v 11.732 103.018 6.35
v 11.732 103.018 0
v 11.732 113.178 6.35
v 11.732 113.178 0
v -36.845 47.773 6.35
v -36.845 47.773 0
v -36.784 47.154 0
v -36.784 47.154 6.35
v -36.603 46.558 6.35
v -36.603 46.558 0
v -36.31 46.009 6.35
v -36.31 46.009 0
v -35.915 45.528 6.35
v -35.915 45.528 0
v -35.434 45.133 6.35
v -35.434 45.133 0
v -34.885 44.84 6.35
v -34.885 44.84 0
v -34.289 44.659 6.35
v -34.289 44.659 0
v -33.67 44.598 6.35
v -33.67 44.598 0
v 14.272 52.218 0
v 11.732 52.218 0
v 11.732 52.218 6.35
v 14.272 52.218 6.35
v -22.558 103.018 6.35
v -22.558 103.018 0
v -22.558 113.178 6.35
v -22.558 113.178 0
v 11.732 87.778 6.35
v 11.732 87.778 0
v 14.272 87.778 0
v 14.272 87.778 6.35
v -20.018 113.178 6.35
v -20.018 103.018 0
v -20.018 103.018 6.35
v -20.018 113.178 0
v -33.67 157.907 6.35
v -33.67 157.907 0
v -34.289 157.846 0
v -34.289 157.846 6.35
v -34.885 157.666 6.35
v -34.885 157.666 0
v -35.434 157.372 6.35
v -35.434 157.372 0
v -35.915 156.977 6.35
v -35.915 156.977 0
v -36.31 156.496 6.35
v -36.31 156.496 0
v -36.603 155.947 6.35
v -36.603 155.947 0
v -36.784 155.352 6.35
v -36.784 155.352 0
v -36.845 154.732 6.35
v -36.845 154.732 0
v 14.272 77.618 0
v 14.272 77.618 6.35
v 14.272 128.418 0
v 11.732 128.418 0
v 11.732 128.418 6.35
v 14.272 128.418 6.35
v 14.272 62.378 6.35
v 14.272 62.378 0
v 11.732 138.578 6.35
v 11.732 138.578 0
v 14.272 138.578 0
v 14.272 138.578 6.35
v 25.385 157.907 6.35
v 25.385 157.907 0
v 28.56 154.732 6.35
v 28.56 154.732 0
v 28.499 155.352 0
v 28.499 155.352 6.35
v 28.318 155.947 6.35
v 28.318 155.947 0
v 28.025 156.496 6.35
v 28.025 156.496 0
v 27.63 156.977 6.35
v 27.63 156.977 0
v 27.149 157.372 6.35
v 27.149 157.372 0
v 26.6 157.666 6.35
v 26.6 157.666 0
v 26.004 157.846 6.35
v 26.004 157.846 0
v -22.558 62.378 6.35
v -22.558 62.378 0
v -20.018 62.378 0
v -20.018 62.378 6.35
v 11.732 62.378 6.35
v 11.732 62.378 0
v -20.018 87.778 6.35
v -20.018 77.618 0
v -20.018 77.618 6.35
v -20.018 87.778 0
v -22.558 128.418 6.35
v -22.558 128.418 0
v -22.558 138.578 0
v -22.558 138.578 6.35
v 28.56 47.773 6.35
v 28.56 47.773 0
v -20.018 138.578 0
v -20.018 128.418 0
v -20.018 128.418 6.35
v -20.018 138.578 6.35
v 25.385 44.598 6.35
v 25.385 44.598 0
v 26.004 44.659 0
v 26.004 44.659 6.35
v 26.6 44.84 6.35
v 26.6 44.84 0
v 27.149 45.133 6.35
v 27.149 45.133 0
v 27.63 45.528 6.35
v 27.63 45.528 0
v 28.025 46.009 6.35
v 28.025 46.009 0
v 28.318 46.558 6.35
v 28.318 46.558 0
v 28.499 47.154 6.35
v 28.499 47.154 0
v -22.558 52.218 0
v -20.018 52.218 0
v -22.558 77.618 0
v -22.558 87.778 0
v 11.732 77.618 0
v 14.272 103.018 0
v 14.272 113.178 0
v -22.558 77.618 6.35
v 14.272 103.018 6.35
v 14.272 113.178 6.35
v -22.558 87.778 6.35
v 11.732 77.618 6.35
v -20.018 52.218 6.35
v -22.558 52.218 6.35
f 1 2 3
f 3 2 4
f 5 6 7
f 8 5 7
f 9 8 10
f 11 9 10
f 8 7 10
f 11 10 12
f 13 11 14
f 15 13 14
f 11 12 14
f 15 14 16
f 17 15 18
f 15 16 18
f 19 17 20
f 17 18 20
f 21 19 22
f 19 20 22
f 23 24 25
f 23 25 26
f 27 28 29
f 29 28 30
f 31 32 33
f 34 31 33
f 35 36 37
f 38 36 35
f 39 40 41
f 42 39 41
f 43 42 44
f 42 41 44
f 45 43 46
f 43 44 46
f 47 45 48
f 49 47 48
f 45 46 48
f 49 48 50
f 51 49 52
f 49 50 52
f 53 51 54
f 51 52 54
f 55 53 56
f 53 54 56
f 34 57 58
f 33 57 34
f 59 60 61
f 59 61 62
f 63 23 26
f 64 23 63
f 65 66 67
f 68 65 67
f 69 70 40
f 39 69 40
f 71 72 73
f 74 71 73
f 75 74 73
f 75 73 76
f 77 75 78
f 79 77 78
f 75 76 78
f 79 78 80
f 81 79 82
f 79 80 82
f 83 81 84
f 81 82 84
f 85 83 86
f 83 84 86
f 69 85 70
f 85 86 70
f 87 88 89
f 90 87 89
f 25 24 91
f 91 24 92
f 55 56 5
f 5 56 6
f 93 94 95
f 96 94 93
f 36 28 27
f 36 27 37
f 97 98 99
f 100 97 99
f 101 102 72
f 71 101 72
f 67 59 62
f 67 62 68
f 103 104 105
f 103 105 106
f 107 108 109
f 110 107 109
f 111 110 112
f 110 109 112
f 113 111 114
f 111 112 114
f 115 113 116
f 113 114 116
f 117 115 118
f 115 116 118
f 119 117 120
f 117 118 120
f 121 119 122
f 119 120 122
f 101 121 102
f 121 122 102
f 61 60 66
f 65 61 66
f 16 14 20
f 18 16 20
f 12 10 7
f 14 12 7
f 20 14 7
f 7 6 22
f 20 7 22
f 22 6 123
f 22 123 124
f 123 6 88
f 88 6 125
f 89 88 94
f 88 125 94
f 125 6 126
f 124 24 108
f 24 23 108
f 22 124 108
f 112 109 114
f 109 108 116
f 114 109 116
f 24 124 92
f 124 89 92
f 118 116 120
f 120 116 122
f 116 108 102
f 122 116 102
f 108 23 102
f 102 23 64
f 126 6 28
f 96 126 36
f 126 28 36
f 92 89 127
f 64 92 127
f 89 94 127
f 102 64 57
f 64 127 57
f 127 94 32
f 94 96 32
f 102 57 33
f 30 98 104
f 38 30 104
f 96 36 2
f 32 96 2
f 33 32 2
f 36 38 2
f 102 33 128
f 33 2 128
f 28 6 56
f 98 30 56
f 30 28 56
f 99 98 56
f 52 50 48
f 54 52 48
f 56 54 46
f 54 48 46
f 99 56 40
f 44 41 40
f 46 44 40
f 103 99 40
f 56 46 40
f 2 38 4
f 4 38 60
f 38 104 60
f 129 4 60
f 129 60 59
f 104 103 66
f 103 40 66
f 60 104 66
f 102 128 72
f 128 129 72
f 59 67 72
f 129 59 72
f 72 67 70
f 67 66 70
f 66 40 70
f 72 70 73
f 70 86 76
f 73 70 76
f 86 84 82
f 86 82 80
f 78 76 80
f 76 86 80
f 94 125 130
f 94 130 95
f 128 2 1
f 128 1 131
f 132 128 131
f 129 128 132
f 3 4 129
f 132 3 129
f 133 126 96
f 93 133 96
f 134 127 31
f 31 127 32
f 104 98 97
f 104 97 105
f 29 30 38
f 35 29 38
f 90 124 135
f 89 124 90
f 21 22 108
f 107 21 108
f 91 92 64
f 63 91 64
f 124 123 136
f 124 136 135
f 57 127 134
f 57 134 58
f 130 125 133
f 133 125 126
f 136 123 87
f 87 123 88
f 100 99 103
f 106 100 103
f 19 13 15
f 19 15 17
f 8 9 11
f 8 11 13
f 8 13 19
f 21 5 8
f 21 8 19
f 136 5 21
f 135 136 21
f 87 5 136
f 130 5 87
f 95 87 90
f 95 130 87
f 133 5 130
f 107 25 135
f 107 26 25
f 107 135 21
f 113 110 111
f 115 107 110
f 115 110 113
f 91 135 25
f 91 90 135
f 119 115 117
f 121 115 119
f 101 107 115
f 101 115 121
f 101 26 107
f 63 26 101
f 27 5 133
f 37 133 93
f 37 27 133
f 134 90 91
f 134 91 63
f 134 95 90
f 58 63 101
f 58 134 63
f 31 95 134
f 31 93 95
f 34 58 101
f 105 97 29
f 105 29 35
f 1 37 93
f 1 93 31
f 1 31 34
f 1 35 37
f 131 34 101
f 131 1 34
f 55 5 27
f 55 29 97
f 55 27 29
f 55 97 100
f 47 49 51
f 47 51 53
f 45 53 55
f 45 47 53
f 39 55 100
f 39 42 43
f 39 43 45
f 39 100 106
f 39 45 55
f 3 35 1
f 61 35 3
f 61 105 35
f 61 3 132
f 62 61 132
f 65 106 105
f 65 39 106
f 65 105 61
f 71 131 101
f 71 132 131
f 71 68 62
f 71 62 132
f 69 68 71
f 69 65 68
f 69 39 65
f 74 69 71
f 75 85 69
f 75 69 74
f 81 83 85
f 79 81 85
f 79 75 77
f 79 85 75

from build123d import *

# Parameters (mm, degrees)
F0_W     = 2.54
F0_H     = 10.16
F1_DEPTH = 6.35


with BuildPart() as f1:
    # F0 (on Top) → F1 (new body)
    with BuildSketch(Plane.XY):
        with BuildLine():
            ThreePointArc((-36.84507, 47.773027), (-35.915134, 45.527963), (-33.67007, 44.598027))
            Line((-33.67007, 44.598027), (25.38493, 44.598027))
            ThreePointArc((25.38493, 44.598027), (27.629994, 45.527963), (28.55993, 47.773027))
            Line((28.55993, 47.773027), (28.55993, 154.732427))
            ThreePointArc((28.55993, 154.732427), (27.629994, 156.977491), (25.38493, 157.907427))
            Line((25.38493, 157.907427), (-33.67007, 157.907427))
            ThreePointArc((-33.67007, 157.907427), (-35.915134, 156.977491), (-36.84507, 154.732427))
            Line((-36.84507, 154.732427), (-36.84507, 47.773027))
        make_face()
        with Locations((-21.28757, 57.298027)):
            Rectangle(F0_W, F0_H, mode=Mode.SUBTRACT)
        with Locations((-21.28757, 82.698027)):
            Rectangle(F0_W, F0_H, mode=Mode.SUBTRACT)
        with Locations((13.00243, 57.298027)):
            Rectangle(F0_W, F0_H, mode=Mode.SUBTRACT)
        with Locations((13.00243, 82.698027)):
            Rectangle(F0_W, F0_H, mode=Mode.SUBTRACT)
        with Locations((-21.28757, 108.098027)):
            Rectangle(F0_W, F0_H, mode=Mode.SUBTRACT)
        with Locations((-21.28757, 133.498027)):
            Rectangle(F0_W, F0_H, mode=Mode.SUBTRACT)
        with Locations((13.00243, 108.098027)):
            Rectangle(F0_W, F0_H, mode=Mode.SUBTRACT)
        with Locations((13.00243, 133.498027)):
            Rectangle(F0_W, F0_H, mode=Mode.SUBTRACT)
    extrude(amount=F1_DEPTH)


solid = f1.part
